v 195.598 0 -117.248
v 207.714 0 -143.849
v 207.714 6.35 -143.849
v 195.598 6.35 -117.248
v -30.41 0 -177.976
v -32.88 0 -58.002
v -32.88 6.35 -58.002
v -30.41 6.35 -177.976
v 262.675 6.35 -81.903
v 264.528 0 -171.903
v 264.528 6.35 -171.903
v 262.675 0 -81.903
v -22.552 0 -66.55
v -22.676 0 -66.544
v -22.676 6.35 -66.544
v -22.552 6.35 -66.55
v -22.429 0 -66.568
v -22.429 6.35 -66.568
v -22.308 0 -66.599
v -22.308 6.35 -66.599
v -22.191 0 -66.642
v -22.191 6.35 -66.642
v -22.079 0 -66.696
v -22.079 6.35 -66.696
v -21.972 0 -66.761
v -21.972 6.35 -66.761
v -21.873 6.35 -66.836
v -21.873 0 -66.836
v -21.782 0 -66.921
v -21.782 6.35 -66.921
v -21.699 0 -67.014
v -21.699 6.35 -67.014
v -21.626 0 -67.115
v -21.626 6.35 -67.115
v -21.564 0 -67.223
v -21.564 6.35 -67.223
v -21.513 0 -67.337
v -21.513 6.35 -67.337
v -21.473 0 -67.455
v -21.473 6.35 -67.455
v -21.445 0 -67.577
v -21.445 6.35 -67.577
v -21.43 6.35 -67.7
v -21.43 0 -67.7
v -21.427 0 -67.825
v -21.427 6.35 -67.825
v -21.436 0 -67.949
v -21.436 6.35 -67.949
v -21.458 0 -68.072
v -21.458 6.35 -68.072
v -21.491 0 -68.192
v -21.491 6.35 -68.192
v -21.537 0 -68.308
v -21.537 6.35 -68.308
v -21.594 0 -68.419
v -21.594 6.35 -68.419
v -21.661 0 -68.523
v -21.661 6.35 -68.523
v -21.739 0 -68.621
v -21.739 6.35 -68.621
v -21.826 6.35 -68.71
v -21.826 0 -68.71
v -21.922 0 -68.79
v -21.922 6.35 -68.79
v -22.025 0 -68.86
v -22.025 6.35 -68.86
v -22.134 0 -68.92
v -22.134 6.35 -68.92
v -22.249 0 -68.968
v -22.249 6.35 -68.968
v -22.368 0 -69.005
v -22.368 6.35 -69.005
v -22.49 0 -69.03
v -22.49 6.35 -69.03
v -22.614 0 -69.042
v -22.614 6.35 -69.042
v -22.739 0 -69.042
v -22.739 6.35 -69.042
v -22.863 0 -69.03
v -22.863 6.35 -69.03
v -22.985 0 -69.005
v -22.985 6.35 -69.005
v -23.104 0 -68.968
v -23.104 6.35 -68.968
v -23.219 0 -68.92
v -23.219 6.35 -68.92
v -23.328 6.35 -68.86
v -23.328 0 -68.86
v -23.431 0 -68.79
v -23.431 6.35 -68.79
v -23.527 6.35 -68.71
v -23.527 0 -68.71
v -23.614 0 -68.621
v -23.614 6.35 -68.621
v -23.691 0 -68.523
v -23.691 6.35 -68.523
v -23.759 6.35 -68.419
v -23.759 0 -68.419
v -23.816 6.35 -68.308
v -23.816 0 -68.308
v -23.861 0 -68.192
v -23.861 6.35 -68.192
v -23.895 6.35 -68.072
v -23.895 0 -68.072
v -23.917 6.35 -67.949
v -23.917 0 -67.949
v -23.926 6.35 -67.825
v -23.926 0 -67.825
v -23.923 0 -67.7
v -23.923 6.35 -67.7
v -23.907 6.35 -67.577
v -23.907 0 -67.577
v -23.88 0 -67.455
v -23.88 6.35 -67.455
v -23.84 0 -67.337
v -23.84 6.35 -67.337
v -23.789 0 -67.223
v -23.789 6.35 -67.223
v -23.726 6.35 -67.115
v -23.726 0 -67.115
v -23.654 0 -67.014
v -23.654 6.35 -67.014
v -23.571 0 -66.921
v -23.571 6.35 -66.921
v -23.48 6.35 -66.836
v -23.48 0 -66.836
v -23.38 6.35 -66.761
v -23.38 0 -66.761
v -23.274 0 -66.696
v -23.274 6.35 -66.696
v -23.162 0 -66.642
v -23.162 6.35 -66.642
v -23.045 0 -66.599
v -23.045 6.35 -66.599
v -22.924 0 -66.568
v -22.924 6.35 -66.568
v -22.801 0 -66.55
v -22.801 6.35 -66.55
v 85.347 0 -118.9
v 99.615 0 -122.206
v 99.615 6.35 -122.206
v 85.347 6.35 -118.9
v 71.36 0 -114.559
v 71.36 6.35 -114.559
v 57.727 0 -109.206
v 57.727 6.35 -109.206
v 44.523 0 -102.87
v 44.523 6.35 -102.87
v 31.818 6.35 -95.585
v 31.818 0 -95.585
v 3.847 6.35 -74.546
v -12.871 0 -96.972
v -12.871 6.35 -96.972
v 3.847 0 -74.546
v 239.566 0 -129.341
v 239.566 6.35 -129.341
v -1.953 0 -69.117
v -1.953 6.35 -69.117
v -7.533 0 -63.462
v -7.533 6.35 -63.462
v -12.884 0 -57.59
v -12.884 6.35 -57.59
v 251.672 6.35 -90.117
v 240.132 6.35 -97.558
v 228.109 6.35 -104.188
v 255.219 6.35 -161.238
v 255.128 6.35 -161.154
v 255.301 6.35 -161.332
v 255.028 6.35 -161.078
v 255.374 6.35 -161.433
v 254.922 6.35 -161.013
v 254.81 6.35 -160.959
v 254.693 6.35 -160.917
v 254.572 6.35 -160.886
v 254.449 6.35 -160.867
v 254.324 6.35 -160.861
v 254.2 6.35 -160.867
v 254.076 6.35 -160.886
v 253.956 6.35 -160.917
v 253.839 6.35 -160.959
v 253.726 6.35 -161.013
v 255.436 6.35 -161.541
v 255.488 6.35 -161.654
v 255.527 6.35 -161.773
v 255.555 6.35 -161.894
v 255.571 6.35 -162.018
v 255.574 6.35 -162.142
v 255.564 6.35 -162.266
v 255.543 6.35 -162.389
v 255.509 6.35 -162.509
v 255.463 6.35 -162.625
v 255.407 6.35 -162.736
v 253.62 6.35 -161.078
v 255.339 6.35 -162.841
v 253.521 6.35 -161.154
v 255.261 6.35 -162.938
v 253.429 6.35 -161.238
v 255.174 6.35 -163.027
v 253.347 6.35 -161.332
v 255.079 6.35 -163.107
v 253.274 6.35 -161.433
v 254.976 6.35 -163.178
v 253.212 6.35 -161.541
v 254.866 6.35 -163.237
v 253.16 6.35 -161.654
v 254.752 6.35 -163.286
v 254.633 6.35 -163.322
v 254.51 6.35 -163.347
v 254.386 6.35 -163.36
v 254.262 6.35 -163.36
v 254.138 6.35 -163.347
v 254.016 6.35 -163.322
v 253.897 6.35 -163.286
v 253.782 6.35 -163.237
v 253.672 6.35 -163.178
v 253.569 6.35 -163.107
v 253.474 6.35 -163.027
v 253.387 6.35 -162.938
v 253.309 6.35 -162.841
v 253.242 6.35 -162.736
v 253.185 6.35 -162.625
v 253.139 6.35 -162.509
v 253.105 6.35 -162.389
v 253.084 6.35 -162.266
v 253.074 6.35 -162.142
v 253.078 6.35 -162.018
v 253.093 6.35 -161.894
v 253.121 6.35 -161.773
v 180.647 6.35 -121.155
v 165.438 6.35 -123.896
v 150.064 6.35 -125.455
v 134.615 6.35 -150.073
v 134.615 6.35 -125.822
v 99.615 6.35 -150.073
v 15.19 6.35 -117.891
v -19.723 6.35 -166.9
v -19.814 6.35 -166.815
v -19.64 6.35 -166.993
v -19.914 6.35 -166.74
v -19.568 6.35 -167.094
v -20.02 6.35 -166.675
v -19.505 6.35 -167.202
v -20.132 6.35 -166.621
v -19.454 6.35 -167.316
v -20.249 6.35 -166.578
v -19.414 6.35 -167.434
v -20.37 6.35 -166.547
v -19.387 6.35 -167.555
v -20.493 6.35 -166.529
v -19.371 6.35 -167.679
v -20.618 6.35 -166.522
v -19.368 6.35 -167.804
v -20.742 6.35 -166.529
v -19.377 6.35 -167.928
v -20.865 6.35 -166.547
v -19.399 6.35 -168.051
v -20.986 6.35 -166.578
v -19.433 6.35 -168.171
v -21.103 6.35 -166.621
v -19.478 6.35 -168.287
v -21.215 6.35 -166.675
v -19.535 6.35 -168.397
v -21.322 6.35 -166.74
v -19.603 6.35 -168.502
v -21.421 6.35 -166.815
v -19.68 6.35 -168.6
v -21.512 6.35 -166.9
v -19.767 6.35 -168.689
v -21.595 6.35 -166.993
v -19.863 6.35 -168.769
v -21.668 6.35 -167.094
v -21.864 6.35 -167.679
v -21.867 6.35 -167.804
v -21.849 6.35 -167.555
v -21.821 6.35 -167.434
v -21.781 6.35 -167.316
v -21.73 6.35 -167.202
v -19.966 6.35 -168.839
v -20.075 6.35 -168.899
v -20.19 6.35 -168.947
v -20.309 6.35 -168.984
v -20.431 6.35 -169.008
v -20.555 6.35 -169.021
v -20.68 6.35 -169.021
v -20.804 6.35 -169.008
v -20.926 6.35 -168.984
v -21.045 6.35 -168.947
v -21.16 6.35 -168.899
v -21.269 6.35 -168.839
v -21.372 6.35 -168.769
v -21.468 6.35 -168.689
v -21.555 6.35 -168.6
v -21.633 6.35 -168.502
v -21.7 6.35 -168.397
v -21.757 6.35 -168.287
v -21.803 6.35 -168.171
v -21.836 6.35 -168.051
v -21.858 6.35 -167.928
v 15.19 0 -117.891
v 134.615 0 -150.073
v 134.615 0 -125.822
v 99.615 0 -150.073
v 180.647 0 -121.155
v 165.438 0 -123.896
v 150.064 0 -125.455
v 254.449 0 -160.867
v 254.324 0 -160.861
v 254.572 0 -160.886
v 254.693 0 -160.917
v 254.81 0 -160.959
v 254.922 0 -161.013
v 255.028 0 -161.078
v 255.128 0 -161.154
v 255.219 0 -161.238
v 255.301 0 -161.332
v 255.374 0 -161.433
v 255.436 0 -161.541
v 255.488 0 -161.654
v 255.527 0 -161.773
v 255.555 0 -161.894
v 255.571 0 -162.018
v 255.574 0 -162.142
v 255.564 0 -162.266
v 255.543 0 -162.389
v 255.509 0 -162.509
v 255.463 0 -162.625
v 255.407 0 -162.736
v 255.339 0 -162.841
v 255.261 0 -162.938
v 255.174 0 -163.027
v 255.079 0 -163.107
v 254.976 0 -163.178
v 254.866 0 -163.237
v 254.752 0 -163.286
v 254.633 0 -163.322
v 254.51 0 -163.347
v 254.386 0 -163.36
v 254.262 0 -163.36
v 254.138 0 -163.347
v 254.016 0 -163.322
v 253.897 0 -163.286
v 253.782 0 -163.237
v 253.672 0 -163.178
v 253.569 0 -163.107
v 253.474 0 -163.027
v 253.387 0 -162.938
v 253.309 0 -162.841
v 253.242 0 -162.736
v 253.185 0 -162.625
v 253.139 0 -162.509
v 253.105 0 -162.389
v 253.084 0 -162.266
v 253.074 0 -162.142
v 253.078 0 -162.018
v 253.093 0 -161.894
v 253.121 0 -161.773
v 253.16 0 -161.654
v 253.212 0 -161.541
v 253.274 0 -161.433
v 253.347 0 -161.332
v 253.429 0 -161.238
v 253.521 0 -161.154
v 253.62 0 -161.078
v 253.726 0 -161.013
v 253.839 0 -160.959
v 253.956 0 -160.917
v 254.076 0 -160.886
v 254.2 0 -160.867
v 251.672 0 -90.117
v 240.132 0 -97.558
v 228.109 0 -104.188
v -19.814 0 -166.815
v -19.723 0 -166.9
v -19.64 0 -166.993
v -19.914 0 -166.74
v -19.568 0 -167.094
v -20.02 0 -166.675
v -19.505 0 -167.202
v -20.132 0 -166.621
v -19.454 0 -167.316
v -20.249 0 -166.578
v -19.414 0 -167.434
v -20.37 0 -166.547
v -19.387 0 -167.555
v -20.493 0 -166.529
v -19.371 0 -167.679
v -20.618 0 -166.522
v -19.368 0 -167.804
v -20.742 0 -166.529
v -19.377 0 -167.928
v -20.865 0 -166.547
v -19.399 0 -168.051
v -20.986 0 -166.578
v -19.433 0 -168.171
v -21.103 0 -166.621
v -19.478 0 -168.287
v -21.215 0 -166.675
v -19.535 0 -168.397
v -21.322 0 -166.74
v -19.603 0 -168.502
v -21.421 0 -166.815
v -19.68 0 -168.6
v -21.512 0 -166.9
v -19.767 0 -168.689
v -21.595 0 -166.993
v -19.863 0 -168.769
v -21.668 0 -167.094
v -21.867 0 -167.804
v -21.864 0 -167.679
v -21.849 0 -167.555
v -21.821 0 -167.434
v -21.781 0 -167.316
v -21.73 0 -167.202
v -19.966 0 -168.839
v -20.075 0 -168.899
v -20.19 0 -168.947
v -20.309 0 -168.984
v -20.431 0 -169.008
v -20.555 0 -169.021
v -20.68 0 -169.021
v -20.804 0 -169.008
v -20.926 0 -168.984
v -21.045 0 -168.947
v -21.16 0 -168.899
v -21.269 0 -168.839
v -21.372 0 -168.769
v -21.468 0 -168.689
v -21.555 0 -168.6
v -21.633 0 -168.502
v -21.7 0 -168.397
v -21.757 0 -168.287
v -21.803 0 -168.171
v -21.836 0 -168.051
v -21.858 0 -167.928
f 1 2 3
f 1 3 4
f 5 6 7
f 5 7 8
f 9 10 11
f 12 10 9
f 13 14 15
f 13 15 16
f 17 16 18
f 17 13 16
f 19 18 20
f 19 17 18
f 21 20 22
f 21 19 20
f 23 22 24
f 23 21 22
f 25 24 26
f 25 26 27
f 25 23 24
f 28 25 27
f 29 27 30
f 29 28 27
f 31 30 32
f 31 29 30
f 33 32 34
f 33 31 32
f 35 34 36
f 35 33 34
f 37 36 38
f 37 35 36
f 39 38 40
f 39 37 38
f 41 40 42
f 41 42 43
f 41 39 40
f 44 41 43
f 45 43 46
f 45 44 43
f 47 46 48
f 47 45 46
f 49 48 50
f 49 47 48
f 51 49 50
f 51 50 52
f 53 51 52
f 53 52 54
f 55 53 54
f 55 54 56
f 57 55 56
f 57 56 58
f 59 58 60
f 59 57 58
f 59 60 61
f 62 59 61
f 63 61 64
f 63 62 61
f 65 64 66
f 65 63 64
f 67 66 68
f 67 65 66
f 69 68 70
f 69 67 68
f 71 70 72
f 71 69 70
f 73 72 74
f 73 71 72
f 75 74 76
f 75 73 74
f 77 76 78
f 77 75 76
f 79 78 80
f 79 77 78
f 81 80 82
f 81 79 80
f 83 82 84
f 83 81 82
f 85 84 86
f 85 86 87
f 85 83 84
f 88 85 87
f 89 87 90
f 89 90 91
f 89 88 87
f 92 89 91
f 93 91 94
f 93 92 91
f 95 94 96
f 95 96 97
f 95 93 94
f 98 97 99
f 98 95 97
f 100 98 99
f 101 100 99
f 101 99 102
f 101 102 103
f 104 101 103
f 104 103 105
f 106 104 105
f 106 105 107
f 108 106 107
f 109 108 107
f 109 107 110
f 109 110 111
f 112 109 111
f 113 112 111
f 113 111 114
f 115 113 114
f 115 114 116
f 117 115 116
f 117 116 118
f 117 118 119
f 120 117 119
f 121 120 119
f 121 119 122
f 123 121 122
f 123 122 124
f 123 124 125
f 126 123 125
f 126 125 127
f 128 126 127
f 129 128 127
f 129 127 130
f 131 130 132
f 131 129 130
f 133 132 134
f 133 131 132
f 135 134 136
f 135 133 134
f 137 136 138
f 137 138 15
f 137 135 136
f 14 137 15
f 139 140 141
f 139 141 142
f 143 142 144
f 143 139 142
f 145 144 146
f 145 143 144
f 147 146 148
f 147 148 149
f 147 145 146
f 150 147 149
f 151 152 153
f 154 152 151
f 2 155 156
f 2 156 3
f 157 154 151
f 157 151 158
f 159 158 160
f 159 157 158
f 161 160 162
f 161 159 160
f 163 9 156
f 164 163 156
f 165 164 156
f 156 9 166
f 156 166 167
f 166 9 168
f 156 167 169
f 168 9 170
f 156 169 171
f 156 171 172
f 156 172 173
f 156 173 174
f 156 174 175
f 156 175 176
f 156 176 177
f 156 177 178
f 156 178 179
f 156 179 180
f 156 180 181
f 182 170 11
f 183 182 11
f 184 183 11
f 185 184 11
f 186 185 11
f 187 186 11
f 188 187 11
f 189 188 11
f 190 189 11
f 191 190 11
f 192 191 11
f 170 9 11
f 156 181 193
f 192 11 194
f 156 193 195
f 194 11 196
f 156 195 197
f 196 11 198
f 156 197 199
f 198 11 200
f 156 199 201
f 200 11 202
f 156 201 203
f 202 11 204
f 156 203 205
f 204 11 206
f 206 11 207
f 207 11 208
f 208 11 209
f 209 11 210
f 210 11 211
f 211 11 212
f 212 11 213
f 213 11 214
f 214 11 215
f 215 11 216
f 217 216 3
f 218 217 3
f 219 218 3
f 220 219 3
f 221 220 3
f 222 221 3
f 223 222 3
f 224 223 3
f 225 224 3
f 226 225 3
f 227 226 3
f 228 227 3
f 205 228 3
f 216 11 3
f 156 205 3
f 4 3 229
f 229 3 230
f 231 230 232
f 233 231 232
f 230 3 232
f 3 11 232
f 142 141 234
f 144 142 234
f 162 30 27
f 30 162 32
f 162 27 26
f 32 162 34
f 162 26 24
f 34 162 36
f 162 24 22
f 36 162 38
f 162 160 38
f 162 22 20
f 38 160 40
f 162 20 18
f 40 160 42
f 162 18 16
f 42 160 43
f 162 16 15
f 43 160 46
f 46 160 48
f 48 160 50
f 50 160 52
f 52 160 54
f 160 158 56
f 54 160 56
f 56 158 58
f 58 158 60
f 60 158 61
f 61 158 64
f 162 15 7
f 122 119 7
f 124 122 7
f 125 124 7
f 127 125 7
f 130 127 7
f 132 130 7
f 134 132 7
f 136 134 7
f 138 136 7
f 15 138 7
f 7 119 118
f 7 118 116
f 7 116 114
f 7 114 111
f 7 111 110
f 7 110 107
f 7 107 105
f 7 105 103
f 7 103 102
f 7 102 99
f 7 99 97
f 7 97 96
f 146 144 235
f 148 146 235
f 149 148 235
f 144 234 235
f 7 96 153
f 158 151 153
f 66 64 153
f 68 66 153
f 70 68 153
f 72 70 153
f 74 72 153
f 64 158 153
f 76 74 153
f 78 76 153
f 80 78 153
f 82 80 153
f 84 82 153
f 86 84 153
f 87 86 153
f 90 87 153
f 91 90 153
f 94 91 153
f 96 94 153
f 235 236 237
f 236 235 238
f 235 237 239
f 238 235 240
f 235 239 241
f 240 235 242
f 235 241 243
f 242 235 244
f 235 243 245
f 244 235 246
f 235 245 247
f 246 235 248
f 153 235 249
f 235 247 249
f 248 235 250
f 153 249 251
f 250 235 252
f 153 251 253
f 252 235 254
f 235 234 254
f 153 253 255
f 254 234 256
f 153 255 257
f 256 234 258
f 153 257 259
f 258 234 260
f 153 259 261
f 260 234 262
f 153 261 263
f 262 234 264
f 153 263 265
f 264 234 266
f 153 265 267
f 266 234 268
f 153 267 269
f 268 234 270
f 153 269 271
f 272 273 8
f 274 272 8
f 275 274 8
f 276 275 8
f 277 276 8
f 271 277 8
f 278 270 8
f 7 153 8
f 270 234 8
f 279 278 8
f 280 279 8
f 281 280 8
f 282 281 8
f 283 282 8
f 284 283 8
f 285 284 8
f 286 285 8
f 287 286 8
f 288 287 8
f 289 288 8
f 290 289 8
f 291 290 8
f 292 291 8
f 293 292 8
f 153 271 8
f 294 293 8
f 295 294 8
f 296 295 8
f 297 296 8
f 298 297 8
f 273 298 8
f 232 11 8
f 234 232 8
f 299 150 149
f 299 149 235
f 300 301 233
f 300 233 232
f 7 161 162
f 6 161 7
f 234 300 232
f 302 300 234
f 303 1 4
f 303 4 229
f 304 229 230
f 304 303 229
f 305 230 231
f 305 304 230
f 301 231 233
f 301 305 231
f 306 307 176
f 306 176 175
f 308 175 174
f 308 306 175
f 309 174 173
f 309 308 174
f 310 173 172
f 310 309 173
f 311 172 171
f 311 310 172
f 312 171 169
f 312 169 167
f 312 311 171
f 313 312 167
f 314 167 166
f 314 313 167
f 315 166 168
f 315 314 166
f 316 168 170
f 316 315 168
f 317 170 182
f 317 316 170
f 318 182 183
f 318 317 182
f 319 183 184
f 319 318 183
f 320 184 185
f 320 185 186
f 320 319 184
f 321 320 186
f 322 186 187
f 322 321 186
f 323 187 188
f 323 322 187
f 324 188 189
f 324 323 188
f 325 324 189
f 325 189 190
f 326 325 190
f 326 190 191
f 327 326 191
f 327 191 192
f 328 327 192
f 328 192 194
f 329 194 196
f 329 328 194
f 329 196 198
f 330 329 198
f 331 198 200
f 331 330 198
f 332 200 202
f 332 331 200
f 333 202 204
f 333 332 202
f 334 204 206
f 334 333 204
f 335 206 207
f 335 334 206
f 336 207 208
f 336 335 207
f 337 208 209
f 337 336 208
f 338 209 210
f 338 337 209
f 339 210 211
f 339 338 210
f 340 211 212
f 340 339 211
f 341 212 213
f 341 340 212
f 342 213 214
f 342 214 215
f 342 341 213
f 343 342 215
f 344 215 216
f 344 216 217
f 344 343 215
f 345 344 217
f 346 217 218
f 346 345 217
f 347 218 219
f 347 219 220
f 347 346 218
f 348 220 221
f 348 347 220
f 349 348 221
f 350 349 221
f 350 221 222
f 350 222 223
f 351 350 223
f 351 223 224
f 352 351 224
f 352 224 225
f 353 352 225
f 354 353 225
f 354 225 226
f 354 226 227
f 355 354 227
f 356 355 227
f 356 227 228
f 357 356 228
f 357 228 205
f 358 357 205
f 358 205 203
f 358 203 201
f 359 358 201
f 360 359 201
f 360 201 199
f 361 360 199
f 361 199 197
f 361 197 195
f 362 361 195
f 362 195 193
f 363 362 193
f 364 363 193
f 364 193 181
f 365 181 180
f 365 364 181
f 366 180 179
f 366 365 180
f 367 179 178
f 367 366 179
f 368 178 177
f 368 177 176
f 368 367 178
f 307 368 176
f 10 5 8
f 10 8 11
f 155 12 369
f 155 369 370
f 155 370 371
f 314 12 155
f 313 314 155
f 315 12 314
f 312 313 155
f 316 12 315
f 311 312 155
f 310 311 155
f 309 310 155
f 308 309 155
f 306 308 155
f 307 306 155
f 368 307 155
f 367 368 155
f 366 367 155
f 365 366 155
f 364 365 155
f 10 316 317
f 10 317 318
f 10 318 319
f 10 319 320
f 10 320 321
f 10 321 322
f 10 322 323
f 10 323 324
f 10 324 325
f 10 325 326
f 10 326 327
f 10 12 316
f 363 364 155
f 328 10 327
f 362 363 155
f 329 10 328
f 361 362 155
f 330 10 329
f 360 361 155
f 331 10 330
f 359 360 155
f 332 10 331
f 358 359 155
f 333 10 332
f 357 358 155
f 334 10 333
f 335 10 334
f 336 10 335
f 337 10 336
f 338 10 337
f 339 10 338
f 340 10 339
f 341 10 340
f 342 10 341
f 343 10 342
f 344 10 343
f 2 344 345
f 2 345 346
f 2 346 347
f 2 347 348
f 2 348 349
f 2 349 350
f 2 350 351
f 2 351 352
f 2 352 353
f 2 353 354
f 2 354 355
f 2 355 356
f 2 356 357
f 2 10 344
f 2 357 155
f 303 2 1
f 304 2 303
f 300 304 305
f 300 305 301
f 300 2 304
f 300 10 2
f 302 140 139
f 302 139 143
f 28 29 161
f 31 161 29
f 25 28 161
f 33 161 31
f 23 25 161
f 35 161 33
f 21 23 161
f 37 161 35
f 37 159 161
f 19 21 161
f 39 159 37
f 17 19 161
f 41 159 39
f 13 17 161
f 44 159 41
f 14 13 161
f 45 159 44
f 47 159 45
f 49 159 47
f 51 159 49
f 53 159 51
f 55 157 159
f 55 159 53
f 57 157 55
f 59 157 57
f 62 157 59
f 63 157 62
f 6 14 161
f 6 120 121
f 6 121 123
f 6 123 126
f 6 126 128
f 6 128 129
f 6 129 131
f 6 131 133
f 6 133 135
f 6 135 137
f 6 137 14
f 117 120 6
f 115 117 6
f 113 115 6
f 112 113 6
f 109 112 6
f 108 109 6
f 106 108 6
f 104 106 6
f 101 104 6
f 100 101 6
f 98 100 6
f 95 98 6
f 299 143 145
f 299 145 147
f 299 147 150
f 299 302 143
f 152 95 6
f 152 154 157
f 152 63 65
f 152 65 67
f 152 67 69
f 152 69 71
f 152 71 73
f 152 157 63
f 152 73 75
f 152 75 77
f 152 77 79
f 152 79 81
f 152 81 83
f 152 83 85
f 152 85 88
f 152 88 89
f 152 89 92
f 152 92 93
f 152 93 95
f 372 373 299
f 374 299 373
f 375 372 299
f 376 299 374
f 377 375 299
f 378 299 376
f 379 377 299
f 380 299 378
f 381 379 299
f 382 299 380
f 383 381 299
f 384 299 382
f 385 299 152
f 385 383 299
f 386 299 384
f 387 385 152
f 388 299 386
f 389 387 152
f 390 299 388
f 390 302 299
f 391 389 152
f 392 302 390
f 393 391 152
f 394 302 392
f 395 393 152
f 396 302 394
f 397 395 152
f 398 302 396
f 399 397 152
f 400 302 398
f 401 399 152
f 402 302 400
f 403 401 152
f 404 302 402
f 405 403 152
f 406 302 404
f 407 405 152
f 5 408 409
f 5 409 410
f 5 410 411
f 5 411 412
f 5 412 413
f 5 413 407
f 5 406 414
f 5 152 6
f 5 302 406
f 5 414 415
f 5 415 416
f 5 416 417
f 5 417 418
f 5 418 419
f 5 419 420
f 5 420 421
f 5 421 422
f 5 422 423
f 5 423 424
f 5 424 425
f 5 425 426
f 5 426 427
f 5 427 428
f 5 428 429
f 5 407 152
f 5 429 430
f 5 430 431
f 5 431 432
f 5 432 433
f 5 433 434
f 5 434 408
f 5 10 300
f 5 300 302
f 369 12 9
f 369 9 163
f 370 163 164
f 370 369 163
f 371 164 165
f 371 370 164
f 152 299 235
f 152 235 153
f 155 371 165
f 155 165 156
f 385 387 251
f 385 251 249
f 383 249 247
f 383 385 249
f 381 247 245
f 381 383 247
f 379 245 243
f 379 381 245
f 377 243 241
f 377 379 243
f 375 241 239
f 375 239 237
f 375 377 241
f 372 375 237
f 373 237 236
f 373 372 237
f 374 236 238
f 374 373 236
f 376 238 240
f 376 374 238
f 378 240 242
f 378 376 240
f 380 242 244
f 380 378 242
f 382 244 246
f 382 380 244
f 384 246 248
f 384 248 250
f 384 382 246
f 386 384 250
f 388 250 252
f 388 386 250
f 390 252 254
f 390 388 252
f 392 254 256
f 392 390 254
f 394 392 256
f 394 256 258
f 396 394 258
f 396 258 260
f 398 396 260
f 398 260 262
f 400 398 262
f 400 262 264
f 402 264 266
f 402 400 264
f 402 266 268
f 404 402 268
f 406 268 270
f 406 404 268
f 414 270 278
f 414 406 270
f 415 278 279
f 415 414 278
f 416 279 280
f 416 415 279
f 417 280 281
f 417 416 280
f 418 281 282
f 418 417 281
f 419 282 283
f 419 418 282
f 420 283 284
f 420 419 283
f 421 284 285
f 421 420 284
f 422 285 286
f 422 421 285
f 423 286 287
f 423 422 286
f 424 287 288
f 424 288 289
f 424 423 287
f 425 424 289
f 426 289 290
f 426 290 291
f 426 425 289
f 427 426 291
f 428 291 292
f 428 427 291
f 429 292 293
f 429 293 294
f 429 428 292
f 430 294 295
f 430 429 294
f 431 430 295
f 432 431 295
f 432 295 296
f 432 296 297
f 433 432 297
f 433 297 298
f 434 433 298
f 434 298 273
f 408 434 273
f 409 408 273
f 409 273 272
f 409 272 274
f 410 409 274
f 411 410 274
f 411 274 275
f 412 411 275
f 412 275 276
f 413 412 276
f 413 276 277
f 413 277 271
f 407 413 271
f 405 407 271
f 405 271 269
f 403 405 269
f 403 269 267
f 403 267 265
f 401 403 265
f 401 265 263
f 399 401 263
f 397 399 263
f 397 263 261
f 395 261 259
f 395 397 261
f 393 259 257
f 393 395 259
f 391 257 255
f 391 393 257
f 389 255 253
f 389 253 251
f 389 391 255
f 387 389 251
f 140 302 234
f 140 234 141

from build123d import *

# Parameters (mm, degrees)
SKETCH1_R           = 1.25
BOSS_EXTRUDE1_DEPTH = 6.35


with BuildPart() as part:
    # Sketch1 → Boss-Extrude1 (new body)
    with BuildSketch(Plane(origin=(0, 0, 0), x_dir=(1, 0, 0), z_dir=(0, 1, 0))):
        with BuildLine():
            Line((-12.884325045, 57.589892951), (-32.880086413, 58.0016299))
            Line((-32.880086413, 58.0016299), (-30.409664718, 177.976198108))
            Line((-30.409664718, 177.976198108), (264.52781546, 171.903078107))
            Line((264.52781546, 171.903078107), (262.674606435, 81.903078107))
            ThreePointArc((262.674606435, 81.903078107), (245.966301841, 93.936578204), (228.109303454, 104.188415872))
            Line((228.109303454, 104.188415872), (239.565645069, 129.341286502))
            Line((239.565645069, 129.341286502), (207.713903894, 143.848752998))
            Line((207.713903894, 143.848752998), (195.598020496, 117.247831174))
            ThreePointArc((195.598020496, 117.247831174), (165.438476431, 123.896281605), (134.614931972, 125.822183564))
            Line((134.614931972, 125.822183564), (134.614931972, 150.073013143))
            Line((134.614931972, 150.073013143), (99.614931972, 150.073013143))
            Line((99.614931972, 150.073013143), (99.614931972, 122.205605467))
            ThreePointArc((99.614931972, 122.205605467), (64.494604203, 112.00765114), (31.818351454, 95.585160423))
            Line((31.818351454, 95.585160423), (15.189825734, 117.890629233))
            Line((15.189825734, 117.890629233), (-12.870789642, 96.971693679))
            Line((-12.870789642, 96.971693679), (3.847059798, 74.546406222))
            ThreePointArc((3.847059798, 74.546406222), (-4.771312567, 66.317474746), (-12.884325045, 57.589892951))
        make_face()
        with Locations(Location((-20.617652508, 167.77244895, 0), (0, 0, 270))):
            Circle(SKETCH1_R, mode=Mode.SUBTRACT)
        with Locations(Location((254.324066301, 162.111065898, 0), (0, 0, 270))):
            Circle(SKETCH1_R, mode=Mode.SUBTRACT)
        with Locations(Location((-22.676337254, 67.79364211, 0), (0, 0, 270))):
            Circle(SKETCH1_R, mode=Mode.SUBTRACT)
    extrude(amount=BOSS_EXTRUDE1_DEPTH)


solid = part.part
